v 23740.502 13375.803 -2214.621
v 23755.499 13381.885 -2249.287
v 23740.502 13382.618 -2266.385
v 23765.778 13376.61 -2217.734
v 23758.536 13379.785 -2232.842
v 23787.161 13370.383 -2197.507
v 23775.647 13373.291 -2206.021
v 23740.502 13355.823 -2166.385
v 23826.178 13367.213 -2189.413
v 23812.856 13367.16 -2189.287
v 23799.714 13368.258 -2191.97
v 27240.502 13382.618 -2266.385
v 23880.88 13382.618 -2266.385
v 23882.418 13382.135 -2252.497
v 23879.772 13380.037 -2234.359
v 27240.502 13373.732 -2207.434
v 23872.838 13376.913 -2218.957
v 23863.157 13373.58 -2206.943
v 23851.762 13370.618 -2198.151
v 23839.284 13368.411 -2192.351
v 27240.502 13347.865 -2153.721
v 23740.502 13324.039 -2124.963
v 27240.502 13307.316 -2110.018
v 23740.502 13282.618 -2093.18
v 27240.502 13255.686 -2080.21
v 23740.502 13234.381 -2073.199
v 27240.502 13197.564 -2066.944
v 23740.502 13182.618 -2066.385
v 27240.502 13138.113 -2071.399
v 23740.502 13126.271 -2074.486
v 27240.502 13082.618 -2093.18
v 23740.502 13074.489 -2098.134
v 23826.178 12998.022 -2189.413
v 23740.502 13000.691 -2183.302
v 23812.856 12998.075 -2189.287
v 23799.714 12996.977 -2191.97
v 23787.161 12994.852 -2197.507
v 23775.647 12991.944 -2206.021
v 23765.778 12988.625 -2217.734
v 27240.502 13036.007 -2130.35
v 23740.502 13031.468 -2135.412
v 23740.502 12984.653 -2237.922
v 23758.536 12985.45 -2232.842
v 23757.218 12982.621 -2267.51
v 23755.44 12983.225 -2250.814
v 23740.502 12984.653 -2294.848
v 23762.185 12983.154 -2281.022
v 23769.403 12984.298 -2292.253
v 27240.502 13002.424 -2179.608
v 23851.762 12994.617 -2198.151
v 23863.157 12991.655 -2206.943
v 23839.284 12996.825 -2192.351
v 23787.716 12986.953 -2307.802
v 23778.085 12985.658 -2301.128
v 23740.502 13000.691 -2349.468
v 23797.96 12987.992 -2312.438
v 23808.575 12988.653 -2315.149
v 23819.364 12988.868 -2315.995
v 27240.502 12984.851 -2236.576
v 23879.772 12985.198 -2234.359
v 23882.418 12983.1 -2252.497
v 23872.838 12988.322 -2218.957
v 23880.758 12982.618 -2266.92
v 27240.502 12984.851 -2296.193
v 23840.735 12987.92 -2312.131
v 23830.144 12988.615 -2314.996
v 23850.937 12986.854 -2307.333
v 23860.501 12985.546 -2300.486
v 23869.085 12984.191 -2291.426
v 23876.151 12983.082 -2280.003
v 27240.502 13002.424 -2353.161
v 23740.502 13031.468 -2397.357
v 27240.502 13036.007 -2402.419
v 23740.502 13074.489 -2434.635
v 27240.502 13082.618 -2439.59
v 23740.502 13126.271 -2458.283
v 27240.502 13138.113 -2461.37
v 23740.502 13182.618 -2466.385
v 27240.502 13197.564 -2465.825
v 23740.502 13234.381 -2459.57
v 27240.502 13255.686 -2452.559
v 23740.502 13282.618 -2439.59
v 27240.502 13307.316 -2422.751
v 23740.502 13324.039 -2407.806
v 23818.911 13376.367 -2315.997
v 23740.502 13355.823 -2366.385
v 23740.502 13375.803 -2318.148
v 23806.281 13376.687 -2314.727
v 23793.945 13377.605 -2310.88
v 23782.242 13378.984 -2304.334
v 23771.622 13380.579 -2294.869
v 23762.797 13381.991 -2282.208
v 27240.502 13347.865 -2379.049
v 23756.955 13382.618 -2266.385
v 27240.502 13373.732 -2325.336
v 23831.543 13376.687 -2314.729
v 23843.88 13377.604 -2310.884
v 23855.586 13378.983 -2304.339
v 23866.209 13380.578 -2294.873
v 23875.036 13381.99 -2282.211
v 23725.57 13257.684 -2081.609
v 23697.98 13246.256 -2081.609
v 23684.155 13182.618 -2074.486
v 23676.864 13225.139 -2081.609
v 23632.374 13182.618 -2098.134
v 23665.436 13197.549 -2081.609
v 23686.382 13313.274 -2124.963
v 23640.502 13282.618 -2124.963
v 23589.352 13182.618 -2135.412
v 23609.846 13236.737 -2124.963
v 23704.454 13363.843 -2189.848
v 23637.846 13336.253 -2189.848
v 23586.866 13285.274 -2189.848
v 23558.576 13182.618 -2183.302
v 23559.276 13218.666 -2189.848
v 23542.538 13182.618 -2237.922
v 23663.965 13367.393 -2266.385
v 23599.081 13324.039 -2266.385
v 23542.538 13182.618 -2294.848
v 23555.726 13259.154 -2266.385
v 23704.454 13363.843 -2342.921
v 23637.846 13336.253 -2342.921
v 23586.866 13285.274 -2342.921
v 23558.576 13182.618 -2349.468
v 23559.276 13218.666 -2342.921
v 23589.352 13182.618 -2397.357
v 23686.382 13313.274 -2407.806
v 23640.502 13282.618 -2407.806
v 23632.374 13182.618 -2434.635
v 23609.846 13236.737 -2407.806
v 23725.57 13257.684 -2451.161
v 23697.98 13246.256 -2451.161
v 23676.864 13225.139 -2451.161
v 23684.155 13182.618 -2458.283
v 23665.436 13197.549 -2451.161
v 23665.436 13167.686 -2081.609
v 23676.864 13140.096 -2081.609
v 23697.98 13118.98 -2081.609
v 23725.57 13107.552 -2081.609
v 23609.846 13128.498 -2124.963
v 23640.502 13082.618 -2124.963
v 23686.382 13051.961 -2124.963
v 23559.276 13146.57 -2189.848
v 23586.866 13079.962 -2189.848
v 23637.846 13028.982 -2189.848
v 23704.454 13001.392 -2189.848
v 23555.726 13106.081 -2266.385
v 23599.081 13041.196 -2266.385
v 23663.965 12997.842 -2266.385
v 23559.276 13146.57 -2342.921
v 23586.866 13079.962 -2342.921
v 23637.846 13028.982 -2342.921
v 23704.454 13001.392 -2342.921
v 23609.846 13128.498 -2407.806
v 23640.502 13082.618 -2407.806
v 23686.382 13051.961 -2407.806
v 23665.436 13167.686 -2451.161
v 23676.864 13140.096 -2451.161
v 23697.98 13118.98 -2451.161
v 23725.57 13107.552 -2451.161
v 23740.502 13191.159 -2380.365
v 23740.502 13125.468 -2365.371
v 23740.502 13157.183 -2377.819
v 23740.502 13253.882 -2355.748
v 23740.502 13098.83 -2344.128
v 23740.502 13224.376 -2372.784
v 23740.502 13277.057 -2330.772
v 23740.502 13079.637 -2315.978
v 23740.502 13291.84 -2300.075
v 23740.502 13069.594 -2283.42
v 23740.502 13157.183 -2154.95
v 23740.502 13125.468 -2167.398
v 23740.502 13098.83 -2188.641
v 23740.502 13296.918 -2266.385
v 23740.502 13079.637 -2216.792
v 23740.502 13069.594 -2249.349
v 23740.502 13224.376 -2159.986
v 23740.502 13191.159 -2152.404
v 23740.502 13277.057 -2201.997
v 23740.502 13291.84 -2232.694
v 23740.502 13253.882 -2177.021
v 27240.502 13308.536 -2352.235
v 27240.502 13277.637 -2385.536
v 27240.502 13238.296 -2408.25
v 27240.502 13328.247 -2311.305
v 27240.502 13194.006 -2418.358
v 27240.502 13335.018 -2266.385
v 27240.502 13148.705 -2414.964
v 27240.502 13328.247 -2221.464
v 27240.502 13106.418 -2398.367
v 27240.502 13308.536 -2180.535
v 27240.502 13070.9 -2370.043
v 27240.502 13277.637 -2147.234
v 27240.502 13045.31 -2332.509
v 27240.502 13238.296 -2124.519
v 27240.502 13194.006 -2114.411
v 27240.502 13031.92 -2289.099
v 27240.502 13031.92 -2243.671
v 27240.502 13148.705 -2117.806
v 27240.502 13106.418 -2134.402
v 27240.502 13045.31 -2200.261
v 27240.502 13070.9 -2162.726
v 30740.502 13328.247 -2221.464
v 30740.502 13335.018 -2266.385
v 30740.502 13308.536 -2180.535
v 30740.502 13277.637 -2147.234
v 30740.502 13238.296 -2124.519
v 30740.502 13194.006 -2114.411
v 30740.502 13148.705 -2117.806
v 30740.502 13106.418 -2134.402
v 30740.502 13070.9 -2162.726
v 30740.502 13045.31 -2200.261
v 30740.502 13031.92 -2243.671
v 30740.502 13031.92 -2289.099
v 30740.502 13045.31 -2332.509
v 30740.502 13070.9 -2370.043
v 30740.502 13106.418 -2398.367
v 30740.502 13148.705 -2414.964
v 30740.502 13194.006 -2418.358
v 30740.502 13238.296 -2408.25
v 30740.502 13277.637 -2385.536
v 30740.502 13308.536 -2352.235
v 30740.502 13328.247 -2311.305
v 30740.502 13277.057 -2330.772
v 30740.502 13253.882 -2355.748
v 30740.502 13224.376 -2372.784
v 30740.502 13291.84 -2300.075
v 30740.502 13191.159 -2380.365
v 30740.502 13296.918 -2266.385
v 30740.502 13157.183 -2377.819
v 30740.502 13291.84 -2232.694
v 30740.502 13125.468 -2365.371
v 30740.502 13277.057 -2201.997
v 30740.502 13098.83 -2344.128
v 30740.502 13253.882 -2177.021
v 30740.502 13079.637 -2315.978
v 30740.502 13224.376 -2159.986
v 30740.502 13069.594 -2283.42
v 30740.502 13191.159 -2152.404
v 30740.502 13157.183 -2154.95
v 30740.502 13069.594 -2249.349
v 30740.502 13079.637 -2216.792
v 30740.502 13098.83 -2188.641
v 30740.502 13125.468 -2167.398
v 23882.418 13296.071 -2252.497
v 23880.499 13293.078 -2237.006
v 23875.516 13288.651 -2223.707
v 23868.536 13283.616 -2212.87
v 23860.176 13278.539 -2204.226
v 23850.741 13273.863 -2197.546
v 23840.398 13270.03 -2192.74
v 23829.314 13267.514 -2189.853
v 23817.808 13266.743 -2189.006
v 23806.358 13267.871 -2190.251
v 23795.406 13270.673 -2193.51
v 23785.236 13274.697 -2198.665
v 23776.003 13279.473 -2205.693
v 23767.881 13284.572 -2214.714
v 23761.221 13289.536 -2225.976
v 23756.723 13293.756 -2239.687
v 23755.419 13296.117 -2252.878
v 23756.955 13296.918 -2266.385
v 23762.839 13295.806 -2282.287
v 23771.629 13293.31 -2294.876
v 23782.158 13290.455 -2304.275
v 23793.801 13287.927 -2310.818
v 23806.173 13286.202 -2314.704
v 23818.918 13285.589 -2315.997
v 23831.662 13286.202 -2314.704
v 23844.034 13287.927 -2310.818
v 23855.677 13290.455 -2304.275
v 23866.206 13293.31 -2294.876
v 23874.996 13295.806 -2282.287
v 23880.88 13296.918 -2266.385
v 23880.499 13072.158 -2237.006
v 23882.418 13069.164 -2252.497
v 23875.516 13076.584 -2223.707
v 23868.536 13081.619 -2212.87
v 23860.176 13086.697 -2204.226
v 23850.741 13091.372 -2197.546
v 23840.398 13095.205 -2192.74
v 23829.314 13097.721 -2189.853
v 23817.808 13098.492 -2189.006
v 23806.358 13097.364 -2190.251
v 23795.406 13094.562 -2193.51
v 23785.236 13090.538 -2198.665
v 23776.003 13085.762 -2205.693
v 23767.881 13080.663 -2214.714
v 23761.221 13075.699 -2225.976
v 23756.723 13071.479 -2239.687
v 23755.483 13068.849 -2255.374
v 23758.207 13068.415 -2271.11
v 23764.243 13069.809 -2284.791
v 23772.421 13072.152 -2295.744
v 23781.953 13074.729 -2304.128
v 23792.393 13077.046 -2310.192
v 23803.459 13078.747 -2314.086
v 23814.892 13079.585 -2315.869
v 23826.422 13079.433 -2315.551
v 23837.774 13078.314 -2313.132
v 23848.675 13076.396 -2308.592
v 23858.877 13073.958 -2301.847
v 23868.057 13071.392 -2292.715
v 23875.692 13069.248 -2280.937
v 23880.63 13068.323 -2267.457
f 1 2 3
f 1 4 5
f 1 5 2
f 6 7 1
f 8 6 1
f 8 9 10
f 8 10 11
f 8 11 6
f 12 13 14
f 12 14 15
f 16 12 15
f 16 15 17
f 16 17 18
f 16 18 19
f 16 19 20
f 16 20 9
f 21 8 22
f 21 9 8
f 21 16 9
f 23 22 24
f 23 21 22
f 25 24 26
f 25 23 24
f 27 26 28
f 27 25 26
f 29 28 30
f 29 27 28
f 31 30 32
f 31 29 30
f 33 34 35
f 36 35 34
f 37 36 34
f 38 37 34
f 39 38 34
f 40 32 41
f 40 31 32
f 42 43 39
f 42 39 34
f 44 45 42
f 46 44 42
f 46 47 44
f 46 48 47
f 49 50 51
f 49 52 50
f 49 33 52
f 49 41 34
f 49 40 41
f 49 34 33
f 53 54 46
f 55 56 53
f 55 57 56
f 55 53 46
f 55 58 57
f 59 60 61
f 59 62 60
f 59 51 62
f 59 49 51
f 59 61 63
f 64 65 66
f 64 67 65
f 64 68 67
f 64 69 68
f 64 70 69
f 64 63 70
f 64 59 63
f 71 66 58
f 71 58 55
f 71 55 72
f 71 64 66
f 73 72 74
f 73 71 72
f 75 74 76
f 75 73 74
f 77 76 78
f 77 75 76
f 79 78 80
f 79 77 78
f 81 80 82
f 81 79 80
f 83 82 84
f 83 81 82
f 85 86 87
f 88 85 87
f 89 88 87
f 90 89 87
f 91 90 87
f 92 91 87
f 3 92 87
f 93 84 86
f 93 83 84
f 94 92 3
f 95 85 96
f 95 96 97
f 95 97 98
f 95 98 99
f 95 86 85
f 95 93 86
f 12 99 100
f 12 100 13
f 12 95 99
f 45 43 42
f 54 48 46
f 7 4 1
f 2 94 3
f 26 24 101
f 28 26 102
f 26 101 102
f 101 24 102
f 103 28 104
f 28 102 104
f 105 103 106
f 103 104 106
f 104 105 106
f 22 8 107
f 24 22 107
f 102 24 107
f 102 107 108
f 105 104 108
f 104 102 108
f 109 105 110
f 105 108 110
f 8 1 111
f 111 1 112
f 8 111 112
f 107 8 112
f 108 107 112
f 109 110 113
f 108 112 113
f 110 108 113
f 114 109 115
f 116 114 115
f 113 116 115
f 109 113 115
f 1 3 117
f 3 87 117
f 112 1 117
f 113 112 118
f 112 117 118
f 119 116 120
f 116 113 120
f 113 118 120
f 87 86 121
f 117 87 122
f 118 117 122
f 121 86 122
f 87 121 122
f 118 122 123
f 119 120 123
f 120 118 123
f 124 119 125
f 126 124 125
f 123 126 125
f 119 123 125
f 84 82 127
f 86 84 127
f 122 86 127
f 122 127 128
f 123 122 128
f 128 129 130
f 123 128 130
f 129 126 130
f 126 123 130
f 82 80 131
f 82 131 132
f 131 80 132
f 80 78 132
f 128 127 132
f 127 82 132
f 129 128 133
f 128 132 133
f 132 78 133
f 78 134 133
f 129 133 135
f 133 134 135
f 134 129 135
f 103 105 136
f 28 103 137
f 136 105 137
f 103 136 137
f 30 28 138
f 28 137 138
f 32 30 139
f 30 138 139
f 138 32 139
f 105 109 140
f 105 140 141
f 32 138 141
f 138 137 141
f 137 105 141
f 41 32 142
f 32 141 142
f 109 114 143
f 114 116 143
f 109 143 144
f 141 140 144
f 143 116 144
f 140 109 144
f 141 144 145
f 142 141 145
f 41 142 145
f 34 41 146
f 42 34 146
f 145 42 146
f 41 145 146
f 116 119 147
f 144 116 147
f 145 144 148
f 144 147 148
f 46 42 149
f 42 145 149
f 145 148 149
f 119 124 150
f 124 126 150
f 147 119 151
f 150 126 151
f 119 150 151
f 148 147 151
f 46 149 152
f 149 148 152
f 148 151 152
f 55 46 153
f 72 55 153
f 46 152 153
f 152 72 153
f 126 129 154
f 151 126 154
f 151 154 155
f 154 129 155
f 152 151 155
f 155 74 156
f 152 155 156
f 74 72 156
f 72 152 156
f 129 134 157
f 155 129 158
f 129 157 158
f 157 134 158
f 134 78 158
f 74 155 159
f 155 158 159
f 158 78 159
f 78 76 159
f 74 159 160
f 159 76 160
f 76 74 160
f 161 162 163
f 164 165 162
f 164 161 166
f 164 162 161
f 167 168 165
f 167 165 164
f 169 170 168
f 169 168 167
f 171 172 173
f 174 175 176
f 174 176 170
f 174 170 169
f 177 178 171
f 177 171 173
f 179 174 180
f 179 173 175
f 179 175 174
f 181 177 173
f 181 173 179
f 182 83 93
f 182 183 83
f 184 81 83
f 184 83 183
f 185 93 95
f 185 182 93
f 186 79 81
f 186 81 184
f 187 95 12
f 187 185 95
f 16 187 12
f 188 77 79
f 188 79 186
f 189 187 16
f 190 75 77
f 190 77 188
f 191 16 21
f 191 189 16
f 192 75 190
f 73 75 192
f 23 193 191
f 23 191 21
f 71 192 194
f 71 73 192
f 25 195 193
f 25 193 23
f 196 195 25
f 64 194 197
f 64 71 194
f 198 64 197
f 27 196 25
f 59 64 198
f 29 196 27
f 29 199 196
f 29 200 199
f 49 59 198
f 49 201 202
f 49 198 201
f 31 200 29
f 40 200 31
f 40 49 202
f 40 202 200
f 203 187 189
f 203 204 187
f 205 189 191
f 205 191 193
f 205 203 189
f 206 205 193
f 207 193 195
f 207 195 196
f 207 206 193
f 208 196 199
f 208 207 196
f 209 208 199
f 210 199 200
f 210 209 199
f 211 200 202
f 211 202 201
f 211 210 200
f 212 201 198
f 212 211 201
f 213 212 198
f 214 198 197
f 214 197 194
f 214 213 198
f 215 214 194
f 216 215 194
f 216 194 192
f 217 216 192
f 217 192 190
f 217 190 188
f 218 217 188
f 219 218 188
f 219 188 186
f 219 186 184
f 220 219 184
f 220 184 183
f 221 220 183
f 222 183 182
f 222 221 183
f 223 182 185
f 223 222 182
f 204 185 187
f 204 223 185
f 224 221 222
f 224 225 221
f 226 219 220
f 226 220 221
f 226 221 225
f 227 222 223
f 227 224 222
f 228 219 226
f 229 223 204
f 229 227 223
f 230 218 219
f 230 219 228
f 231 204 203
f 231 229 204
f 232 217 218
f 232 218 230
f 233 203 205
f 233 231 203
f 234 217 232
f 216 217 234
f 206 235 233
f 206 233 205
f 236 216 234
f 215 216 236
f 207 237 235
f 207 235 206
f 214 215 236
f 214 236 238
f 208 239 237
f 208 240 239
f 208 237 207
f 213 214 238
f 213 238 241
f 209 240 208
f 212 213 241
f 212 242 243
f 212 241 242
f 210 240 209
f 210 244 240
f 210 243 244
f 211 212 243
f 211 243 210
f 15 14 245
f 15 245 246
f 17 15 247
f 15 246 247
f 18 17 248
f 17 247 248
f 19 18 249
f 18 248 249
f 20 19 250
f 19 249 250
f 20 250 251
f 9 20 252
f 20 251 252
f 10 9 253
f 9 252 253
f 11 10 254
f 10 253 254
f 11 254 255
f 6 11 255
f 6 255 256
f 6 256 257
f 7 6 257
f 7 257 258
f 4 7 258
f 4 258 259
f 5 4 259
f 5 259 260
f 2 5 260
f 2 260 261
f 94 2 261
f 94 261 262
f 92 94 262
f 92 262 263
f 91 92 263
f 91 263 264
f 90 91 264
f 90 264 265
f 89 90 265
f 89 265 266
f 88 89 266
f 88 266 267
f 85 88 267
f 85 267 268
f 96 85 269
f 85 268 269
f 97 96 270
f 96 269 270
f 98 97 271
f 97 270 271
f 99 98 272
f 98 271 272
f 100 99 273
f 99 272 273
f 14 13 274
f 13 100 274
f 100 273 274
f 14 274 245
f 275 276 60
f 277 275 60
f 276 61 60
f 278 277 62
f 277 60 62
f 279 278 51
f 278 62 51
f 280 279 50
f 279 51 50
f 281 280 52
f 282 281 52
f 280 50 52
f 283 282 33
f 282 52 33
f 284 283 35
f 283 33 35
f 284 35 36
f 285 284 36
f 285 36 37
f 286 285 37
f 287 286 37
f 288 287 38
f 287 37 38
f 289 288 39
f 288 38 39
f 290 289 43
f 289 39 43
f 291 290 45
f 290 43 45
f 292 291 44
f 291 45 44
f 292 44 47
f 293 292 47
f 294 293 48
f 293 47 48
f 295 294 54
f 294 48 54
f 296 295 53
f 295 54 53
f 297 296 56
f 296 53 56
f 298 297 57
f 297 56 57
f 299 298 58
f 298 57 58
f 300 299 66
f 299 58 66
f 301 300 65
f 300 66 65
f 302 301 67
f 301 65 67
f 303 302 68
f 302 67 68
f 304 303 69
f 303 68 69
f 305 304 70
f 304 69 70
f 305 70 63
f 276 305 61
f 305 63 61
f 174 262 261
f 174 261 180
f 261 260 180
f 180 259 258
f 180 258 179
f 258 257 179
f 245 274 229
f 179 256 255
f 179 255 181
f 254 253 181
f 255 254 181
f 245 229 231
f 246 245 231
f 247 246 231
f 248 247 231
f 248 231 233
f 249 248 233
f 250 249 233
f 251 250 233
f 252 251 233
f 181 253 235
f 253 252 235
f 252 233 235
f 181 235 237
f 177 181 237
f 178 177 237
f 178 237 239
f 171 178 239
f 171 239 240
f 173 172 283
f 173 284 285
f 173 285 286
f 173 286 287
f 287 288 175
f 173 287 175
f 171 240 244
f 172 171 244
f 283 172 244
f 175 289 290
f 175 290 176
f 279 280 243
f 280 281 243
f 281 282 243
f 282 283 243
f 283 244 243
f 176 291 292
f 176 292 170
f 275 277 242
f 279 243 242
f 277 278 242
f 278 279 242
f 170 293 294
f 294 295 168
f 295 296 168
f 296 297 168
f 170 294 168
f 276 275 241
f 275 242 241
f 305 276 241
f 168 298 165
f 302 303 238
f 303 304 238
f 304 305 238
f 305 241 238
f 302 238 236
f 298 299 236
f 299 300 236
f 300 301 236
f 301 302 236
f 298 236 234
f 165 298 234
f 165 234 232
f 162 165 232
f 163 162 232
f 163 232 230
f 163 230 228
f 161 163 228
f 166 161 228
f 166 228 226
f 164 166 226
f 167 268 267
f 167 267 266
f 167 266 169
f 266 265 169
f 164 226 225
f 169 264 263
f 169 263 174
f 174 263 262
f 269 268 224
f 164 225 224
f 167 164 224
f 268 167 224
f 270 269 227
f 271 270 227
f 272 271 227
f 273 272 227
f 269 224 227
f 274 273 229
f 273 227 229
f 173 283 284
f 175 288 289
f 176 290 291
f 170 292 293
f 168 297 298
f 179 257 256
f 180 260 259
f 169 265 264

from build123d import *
from build123d.topology import SkipClean

# Parameters (mm, degrees)
SWEEP1_PROFILE_R   = 152.4
SWEEP2_PROFILE_R   = 200
SKETCH99_R         = 114.3
CUT_EXTRUDE1_DEPTH = 7000
SKETCH140_R        = 63.5
CUT_EXTRUDE2_DEPTH = 1750


with BuildPart() as part:
    # Sweep1: sweep along a path in Sketch2
    with BuildLine(Plane(origin=(1e-09, 13182.61759136, 0), x_dir=(1, 0, 0), z_dir=(0, 1, 0))) as sweep1_path:
        Line((23740.501936611, 2266.384637986), (30740.501936611, 2266.384637986))
    # Sweep1 profile (on start of the path) → Sweep1 (sweep)
    with BuildSketch(Plane(origin=(23740.501936612, 13182.617591358, -2266.384637986), x_dir=(0, 1, 0), z_dir=(1, 0, 0))):
        Circle(SWEEP1_PROFILE_R)
    sweep(path=sweep1_path.line)

    # Sweep2: sweep along a path in Sketch31
    with BuildLine(Plane(origin=(1e-09, 13182.61759136, 0), x_dir=(1, 0, 0), z_dir=(0, 1, 0))) as sweep2_path:
        Line((23740.501936611, 2266.384637986), (27240.501936611, 2266.384637986))
    # Sweep2 profile (on start of the path) → Sweep2 (sweep)
    with BuildSketch(Plane(origin=(23740.501936612, 13182.617591358, -2266.384637986), x_dir=(0, 1, 0), z_dir=(1, 0, 0))):
        Circle(SWEEP2_PROFILE_R)
    sweep(path=sweep2_path.line)

    # Sketch66 → Revolve4 (revolve)
    with SkipClean():  # the faces are left unmerged after this step: merging them gives an invalid solid
        with BuildSketch(Plane(origin=(1e-09, 13182.61759136, 0), x_dir=(1, 0, 0), z_dir=(0, 1, 0))):
            with BuildLine():
                Line((23740.501936611, 2466.384637986), (23740.501936611, 2066.384637986))
                ThreePointArc((23740.501936611, 2066.384637986), (23540.501936611, 2266.384637986), (23740.501936611, 2466.384637986))
            make_face()
        revolve(axis=Axis((23740.501936612, 13182.617591358, -2466.384637986), (0, 0, 1)))

    # Sketch99 → Cut-Extrude1 (cut)
    with SkipClean():  # the faces are left unmerged after this step: merging them gives an invalid solid
        with BuildSketch(Plane(origin=(30740.501936611, -2e-09, 0), x_dir=(0, 0, -1), z_dir=(1, 0, 0))):
            with Locations((2266.384637986, 13182.61759136)):
                Circle(SKETCH99_R)
        extrude(amount=-CUT_EXTRUDE1_DEPTH, mode=Mode.SUBTRACT)

    # Sketch140 → Cut-Extrude2 (cut, symmetric)
    with SkipClean():  # the faces are left unmerged after this step: merging them gives an invalid solid
        with BuildSketch(Plane(origin=(187.795896922, 14236.037369872, -4220.063365883), x_dir=(0.9846757772381061, -1.714887253549652e-14, 0.1743949933929635), z_dir=(0, -1, 0))):
            with Locations((23612.126841123, -2183.733894313)):
                Circle(SKETCH140_R)
        extrude(amount=CUT_EXTRUDE2_DEPTH, both=True, mode=Mode.SUBTRACT)


solid = part.part
